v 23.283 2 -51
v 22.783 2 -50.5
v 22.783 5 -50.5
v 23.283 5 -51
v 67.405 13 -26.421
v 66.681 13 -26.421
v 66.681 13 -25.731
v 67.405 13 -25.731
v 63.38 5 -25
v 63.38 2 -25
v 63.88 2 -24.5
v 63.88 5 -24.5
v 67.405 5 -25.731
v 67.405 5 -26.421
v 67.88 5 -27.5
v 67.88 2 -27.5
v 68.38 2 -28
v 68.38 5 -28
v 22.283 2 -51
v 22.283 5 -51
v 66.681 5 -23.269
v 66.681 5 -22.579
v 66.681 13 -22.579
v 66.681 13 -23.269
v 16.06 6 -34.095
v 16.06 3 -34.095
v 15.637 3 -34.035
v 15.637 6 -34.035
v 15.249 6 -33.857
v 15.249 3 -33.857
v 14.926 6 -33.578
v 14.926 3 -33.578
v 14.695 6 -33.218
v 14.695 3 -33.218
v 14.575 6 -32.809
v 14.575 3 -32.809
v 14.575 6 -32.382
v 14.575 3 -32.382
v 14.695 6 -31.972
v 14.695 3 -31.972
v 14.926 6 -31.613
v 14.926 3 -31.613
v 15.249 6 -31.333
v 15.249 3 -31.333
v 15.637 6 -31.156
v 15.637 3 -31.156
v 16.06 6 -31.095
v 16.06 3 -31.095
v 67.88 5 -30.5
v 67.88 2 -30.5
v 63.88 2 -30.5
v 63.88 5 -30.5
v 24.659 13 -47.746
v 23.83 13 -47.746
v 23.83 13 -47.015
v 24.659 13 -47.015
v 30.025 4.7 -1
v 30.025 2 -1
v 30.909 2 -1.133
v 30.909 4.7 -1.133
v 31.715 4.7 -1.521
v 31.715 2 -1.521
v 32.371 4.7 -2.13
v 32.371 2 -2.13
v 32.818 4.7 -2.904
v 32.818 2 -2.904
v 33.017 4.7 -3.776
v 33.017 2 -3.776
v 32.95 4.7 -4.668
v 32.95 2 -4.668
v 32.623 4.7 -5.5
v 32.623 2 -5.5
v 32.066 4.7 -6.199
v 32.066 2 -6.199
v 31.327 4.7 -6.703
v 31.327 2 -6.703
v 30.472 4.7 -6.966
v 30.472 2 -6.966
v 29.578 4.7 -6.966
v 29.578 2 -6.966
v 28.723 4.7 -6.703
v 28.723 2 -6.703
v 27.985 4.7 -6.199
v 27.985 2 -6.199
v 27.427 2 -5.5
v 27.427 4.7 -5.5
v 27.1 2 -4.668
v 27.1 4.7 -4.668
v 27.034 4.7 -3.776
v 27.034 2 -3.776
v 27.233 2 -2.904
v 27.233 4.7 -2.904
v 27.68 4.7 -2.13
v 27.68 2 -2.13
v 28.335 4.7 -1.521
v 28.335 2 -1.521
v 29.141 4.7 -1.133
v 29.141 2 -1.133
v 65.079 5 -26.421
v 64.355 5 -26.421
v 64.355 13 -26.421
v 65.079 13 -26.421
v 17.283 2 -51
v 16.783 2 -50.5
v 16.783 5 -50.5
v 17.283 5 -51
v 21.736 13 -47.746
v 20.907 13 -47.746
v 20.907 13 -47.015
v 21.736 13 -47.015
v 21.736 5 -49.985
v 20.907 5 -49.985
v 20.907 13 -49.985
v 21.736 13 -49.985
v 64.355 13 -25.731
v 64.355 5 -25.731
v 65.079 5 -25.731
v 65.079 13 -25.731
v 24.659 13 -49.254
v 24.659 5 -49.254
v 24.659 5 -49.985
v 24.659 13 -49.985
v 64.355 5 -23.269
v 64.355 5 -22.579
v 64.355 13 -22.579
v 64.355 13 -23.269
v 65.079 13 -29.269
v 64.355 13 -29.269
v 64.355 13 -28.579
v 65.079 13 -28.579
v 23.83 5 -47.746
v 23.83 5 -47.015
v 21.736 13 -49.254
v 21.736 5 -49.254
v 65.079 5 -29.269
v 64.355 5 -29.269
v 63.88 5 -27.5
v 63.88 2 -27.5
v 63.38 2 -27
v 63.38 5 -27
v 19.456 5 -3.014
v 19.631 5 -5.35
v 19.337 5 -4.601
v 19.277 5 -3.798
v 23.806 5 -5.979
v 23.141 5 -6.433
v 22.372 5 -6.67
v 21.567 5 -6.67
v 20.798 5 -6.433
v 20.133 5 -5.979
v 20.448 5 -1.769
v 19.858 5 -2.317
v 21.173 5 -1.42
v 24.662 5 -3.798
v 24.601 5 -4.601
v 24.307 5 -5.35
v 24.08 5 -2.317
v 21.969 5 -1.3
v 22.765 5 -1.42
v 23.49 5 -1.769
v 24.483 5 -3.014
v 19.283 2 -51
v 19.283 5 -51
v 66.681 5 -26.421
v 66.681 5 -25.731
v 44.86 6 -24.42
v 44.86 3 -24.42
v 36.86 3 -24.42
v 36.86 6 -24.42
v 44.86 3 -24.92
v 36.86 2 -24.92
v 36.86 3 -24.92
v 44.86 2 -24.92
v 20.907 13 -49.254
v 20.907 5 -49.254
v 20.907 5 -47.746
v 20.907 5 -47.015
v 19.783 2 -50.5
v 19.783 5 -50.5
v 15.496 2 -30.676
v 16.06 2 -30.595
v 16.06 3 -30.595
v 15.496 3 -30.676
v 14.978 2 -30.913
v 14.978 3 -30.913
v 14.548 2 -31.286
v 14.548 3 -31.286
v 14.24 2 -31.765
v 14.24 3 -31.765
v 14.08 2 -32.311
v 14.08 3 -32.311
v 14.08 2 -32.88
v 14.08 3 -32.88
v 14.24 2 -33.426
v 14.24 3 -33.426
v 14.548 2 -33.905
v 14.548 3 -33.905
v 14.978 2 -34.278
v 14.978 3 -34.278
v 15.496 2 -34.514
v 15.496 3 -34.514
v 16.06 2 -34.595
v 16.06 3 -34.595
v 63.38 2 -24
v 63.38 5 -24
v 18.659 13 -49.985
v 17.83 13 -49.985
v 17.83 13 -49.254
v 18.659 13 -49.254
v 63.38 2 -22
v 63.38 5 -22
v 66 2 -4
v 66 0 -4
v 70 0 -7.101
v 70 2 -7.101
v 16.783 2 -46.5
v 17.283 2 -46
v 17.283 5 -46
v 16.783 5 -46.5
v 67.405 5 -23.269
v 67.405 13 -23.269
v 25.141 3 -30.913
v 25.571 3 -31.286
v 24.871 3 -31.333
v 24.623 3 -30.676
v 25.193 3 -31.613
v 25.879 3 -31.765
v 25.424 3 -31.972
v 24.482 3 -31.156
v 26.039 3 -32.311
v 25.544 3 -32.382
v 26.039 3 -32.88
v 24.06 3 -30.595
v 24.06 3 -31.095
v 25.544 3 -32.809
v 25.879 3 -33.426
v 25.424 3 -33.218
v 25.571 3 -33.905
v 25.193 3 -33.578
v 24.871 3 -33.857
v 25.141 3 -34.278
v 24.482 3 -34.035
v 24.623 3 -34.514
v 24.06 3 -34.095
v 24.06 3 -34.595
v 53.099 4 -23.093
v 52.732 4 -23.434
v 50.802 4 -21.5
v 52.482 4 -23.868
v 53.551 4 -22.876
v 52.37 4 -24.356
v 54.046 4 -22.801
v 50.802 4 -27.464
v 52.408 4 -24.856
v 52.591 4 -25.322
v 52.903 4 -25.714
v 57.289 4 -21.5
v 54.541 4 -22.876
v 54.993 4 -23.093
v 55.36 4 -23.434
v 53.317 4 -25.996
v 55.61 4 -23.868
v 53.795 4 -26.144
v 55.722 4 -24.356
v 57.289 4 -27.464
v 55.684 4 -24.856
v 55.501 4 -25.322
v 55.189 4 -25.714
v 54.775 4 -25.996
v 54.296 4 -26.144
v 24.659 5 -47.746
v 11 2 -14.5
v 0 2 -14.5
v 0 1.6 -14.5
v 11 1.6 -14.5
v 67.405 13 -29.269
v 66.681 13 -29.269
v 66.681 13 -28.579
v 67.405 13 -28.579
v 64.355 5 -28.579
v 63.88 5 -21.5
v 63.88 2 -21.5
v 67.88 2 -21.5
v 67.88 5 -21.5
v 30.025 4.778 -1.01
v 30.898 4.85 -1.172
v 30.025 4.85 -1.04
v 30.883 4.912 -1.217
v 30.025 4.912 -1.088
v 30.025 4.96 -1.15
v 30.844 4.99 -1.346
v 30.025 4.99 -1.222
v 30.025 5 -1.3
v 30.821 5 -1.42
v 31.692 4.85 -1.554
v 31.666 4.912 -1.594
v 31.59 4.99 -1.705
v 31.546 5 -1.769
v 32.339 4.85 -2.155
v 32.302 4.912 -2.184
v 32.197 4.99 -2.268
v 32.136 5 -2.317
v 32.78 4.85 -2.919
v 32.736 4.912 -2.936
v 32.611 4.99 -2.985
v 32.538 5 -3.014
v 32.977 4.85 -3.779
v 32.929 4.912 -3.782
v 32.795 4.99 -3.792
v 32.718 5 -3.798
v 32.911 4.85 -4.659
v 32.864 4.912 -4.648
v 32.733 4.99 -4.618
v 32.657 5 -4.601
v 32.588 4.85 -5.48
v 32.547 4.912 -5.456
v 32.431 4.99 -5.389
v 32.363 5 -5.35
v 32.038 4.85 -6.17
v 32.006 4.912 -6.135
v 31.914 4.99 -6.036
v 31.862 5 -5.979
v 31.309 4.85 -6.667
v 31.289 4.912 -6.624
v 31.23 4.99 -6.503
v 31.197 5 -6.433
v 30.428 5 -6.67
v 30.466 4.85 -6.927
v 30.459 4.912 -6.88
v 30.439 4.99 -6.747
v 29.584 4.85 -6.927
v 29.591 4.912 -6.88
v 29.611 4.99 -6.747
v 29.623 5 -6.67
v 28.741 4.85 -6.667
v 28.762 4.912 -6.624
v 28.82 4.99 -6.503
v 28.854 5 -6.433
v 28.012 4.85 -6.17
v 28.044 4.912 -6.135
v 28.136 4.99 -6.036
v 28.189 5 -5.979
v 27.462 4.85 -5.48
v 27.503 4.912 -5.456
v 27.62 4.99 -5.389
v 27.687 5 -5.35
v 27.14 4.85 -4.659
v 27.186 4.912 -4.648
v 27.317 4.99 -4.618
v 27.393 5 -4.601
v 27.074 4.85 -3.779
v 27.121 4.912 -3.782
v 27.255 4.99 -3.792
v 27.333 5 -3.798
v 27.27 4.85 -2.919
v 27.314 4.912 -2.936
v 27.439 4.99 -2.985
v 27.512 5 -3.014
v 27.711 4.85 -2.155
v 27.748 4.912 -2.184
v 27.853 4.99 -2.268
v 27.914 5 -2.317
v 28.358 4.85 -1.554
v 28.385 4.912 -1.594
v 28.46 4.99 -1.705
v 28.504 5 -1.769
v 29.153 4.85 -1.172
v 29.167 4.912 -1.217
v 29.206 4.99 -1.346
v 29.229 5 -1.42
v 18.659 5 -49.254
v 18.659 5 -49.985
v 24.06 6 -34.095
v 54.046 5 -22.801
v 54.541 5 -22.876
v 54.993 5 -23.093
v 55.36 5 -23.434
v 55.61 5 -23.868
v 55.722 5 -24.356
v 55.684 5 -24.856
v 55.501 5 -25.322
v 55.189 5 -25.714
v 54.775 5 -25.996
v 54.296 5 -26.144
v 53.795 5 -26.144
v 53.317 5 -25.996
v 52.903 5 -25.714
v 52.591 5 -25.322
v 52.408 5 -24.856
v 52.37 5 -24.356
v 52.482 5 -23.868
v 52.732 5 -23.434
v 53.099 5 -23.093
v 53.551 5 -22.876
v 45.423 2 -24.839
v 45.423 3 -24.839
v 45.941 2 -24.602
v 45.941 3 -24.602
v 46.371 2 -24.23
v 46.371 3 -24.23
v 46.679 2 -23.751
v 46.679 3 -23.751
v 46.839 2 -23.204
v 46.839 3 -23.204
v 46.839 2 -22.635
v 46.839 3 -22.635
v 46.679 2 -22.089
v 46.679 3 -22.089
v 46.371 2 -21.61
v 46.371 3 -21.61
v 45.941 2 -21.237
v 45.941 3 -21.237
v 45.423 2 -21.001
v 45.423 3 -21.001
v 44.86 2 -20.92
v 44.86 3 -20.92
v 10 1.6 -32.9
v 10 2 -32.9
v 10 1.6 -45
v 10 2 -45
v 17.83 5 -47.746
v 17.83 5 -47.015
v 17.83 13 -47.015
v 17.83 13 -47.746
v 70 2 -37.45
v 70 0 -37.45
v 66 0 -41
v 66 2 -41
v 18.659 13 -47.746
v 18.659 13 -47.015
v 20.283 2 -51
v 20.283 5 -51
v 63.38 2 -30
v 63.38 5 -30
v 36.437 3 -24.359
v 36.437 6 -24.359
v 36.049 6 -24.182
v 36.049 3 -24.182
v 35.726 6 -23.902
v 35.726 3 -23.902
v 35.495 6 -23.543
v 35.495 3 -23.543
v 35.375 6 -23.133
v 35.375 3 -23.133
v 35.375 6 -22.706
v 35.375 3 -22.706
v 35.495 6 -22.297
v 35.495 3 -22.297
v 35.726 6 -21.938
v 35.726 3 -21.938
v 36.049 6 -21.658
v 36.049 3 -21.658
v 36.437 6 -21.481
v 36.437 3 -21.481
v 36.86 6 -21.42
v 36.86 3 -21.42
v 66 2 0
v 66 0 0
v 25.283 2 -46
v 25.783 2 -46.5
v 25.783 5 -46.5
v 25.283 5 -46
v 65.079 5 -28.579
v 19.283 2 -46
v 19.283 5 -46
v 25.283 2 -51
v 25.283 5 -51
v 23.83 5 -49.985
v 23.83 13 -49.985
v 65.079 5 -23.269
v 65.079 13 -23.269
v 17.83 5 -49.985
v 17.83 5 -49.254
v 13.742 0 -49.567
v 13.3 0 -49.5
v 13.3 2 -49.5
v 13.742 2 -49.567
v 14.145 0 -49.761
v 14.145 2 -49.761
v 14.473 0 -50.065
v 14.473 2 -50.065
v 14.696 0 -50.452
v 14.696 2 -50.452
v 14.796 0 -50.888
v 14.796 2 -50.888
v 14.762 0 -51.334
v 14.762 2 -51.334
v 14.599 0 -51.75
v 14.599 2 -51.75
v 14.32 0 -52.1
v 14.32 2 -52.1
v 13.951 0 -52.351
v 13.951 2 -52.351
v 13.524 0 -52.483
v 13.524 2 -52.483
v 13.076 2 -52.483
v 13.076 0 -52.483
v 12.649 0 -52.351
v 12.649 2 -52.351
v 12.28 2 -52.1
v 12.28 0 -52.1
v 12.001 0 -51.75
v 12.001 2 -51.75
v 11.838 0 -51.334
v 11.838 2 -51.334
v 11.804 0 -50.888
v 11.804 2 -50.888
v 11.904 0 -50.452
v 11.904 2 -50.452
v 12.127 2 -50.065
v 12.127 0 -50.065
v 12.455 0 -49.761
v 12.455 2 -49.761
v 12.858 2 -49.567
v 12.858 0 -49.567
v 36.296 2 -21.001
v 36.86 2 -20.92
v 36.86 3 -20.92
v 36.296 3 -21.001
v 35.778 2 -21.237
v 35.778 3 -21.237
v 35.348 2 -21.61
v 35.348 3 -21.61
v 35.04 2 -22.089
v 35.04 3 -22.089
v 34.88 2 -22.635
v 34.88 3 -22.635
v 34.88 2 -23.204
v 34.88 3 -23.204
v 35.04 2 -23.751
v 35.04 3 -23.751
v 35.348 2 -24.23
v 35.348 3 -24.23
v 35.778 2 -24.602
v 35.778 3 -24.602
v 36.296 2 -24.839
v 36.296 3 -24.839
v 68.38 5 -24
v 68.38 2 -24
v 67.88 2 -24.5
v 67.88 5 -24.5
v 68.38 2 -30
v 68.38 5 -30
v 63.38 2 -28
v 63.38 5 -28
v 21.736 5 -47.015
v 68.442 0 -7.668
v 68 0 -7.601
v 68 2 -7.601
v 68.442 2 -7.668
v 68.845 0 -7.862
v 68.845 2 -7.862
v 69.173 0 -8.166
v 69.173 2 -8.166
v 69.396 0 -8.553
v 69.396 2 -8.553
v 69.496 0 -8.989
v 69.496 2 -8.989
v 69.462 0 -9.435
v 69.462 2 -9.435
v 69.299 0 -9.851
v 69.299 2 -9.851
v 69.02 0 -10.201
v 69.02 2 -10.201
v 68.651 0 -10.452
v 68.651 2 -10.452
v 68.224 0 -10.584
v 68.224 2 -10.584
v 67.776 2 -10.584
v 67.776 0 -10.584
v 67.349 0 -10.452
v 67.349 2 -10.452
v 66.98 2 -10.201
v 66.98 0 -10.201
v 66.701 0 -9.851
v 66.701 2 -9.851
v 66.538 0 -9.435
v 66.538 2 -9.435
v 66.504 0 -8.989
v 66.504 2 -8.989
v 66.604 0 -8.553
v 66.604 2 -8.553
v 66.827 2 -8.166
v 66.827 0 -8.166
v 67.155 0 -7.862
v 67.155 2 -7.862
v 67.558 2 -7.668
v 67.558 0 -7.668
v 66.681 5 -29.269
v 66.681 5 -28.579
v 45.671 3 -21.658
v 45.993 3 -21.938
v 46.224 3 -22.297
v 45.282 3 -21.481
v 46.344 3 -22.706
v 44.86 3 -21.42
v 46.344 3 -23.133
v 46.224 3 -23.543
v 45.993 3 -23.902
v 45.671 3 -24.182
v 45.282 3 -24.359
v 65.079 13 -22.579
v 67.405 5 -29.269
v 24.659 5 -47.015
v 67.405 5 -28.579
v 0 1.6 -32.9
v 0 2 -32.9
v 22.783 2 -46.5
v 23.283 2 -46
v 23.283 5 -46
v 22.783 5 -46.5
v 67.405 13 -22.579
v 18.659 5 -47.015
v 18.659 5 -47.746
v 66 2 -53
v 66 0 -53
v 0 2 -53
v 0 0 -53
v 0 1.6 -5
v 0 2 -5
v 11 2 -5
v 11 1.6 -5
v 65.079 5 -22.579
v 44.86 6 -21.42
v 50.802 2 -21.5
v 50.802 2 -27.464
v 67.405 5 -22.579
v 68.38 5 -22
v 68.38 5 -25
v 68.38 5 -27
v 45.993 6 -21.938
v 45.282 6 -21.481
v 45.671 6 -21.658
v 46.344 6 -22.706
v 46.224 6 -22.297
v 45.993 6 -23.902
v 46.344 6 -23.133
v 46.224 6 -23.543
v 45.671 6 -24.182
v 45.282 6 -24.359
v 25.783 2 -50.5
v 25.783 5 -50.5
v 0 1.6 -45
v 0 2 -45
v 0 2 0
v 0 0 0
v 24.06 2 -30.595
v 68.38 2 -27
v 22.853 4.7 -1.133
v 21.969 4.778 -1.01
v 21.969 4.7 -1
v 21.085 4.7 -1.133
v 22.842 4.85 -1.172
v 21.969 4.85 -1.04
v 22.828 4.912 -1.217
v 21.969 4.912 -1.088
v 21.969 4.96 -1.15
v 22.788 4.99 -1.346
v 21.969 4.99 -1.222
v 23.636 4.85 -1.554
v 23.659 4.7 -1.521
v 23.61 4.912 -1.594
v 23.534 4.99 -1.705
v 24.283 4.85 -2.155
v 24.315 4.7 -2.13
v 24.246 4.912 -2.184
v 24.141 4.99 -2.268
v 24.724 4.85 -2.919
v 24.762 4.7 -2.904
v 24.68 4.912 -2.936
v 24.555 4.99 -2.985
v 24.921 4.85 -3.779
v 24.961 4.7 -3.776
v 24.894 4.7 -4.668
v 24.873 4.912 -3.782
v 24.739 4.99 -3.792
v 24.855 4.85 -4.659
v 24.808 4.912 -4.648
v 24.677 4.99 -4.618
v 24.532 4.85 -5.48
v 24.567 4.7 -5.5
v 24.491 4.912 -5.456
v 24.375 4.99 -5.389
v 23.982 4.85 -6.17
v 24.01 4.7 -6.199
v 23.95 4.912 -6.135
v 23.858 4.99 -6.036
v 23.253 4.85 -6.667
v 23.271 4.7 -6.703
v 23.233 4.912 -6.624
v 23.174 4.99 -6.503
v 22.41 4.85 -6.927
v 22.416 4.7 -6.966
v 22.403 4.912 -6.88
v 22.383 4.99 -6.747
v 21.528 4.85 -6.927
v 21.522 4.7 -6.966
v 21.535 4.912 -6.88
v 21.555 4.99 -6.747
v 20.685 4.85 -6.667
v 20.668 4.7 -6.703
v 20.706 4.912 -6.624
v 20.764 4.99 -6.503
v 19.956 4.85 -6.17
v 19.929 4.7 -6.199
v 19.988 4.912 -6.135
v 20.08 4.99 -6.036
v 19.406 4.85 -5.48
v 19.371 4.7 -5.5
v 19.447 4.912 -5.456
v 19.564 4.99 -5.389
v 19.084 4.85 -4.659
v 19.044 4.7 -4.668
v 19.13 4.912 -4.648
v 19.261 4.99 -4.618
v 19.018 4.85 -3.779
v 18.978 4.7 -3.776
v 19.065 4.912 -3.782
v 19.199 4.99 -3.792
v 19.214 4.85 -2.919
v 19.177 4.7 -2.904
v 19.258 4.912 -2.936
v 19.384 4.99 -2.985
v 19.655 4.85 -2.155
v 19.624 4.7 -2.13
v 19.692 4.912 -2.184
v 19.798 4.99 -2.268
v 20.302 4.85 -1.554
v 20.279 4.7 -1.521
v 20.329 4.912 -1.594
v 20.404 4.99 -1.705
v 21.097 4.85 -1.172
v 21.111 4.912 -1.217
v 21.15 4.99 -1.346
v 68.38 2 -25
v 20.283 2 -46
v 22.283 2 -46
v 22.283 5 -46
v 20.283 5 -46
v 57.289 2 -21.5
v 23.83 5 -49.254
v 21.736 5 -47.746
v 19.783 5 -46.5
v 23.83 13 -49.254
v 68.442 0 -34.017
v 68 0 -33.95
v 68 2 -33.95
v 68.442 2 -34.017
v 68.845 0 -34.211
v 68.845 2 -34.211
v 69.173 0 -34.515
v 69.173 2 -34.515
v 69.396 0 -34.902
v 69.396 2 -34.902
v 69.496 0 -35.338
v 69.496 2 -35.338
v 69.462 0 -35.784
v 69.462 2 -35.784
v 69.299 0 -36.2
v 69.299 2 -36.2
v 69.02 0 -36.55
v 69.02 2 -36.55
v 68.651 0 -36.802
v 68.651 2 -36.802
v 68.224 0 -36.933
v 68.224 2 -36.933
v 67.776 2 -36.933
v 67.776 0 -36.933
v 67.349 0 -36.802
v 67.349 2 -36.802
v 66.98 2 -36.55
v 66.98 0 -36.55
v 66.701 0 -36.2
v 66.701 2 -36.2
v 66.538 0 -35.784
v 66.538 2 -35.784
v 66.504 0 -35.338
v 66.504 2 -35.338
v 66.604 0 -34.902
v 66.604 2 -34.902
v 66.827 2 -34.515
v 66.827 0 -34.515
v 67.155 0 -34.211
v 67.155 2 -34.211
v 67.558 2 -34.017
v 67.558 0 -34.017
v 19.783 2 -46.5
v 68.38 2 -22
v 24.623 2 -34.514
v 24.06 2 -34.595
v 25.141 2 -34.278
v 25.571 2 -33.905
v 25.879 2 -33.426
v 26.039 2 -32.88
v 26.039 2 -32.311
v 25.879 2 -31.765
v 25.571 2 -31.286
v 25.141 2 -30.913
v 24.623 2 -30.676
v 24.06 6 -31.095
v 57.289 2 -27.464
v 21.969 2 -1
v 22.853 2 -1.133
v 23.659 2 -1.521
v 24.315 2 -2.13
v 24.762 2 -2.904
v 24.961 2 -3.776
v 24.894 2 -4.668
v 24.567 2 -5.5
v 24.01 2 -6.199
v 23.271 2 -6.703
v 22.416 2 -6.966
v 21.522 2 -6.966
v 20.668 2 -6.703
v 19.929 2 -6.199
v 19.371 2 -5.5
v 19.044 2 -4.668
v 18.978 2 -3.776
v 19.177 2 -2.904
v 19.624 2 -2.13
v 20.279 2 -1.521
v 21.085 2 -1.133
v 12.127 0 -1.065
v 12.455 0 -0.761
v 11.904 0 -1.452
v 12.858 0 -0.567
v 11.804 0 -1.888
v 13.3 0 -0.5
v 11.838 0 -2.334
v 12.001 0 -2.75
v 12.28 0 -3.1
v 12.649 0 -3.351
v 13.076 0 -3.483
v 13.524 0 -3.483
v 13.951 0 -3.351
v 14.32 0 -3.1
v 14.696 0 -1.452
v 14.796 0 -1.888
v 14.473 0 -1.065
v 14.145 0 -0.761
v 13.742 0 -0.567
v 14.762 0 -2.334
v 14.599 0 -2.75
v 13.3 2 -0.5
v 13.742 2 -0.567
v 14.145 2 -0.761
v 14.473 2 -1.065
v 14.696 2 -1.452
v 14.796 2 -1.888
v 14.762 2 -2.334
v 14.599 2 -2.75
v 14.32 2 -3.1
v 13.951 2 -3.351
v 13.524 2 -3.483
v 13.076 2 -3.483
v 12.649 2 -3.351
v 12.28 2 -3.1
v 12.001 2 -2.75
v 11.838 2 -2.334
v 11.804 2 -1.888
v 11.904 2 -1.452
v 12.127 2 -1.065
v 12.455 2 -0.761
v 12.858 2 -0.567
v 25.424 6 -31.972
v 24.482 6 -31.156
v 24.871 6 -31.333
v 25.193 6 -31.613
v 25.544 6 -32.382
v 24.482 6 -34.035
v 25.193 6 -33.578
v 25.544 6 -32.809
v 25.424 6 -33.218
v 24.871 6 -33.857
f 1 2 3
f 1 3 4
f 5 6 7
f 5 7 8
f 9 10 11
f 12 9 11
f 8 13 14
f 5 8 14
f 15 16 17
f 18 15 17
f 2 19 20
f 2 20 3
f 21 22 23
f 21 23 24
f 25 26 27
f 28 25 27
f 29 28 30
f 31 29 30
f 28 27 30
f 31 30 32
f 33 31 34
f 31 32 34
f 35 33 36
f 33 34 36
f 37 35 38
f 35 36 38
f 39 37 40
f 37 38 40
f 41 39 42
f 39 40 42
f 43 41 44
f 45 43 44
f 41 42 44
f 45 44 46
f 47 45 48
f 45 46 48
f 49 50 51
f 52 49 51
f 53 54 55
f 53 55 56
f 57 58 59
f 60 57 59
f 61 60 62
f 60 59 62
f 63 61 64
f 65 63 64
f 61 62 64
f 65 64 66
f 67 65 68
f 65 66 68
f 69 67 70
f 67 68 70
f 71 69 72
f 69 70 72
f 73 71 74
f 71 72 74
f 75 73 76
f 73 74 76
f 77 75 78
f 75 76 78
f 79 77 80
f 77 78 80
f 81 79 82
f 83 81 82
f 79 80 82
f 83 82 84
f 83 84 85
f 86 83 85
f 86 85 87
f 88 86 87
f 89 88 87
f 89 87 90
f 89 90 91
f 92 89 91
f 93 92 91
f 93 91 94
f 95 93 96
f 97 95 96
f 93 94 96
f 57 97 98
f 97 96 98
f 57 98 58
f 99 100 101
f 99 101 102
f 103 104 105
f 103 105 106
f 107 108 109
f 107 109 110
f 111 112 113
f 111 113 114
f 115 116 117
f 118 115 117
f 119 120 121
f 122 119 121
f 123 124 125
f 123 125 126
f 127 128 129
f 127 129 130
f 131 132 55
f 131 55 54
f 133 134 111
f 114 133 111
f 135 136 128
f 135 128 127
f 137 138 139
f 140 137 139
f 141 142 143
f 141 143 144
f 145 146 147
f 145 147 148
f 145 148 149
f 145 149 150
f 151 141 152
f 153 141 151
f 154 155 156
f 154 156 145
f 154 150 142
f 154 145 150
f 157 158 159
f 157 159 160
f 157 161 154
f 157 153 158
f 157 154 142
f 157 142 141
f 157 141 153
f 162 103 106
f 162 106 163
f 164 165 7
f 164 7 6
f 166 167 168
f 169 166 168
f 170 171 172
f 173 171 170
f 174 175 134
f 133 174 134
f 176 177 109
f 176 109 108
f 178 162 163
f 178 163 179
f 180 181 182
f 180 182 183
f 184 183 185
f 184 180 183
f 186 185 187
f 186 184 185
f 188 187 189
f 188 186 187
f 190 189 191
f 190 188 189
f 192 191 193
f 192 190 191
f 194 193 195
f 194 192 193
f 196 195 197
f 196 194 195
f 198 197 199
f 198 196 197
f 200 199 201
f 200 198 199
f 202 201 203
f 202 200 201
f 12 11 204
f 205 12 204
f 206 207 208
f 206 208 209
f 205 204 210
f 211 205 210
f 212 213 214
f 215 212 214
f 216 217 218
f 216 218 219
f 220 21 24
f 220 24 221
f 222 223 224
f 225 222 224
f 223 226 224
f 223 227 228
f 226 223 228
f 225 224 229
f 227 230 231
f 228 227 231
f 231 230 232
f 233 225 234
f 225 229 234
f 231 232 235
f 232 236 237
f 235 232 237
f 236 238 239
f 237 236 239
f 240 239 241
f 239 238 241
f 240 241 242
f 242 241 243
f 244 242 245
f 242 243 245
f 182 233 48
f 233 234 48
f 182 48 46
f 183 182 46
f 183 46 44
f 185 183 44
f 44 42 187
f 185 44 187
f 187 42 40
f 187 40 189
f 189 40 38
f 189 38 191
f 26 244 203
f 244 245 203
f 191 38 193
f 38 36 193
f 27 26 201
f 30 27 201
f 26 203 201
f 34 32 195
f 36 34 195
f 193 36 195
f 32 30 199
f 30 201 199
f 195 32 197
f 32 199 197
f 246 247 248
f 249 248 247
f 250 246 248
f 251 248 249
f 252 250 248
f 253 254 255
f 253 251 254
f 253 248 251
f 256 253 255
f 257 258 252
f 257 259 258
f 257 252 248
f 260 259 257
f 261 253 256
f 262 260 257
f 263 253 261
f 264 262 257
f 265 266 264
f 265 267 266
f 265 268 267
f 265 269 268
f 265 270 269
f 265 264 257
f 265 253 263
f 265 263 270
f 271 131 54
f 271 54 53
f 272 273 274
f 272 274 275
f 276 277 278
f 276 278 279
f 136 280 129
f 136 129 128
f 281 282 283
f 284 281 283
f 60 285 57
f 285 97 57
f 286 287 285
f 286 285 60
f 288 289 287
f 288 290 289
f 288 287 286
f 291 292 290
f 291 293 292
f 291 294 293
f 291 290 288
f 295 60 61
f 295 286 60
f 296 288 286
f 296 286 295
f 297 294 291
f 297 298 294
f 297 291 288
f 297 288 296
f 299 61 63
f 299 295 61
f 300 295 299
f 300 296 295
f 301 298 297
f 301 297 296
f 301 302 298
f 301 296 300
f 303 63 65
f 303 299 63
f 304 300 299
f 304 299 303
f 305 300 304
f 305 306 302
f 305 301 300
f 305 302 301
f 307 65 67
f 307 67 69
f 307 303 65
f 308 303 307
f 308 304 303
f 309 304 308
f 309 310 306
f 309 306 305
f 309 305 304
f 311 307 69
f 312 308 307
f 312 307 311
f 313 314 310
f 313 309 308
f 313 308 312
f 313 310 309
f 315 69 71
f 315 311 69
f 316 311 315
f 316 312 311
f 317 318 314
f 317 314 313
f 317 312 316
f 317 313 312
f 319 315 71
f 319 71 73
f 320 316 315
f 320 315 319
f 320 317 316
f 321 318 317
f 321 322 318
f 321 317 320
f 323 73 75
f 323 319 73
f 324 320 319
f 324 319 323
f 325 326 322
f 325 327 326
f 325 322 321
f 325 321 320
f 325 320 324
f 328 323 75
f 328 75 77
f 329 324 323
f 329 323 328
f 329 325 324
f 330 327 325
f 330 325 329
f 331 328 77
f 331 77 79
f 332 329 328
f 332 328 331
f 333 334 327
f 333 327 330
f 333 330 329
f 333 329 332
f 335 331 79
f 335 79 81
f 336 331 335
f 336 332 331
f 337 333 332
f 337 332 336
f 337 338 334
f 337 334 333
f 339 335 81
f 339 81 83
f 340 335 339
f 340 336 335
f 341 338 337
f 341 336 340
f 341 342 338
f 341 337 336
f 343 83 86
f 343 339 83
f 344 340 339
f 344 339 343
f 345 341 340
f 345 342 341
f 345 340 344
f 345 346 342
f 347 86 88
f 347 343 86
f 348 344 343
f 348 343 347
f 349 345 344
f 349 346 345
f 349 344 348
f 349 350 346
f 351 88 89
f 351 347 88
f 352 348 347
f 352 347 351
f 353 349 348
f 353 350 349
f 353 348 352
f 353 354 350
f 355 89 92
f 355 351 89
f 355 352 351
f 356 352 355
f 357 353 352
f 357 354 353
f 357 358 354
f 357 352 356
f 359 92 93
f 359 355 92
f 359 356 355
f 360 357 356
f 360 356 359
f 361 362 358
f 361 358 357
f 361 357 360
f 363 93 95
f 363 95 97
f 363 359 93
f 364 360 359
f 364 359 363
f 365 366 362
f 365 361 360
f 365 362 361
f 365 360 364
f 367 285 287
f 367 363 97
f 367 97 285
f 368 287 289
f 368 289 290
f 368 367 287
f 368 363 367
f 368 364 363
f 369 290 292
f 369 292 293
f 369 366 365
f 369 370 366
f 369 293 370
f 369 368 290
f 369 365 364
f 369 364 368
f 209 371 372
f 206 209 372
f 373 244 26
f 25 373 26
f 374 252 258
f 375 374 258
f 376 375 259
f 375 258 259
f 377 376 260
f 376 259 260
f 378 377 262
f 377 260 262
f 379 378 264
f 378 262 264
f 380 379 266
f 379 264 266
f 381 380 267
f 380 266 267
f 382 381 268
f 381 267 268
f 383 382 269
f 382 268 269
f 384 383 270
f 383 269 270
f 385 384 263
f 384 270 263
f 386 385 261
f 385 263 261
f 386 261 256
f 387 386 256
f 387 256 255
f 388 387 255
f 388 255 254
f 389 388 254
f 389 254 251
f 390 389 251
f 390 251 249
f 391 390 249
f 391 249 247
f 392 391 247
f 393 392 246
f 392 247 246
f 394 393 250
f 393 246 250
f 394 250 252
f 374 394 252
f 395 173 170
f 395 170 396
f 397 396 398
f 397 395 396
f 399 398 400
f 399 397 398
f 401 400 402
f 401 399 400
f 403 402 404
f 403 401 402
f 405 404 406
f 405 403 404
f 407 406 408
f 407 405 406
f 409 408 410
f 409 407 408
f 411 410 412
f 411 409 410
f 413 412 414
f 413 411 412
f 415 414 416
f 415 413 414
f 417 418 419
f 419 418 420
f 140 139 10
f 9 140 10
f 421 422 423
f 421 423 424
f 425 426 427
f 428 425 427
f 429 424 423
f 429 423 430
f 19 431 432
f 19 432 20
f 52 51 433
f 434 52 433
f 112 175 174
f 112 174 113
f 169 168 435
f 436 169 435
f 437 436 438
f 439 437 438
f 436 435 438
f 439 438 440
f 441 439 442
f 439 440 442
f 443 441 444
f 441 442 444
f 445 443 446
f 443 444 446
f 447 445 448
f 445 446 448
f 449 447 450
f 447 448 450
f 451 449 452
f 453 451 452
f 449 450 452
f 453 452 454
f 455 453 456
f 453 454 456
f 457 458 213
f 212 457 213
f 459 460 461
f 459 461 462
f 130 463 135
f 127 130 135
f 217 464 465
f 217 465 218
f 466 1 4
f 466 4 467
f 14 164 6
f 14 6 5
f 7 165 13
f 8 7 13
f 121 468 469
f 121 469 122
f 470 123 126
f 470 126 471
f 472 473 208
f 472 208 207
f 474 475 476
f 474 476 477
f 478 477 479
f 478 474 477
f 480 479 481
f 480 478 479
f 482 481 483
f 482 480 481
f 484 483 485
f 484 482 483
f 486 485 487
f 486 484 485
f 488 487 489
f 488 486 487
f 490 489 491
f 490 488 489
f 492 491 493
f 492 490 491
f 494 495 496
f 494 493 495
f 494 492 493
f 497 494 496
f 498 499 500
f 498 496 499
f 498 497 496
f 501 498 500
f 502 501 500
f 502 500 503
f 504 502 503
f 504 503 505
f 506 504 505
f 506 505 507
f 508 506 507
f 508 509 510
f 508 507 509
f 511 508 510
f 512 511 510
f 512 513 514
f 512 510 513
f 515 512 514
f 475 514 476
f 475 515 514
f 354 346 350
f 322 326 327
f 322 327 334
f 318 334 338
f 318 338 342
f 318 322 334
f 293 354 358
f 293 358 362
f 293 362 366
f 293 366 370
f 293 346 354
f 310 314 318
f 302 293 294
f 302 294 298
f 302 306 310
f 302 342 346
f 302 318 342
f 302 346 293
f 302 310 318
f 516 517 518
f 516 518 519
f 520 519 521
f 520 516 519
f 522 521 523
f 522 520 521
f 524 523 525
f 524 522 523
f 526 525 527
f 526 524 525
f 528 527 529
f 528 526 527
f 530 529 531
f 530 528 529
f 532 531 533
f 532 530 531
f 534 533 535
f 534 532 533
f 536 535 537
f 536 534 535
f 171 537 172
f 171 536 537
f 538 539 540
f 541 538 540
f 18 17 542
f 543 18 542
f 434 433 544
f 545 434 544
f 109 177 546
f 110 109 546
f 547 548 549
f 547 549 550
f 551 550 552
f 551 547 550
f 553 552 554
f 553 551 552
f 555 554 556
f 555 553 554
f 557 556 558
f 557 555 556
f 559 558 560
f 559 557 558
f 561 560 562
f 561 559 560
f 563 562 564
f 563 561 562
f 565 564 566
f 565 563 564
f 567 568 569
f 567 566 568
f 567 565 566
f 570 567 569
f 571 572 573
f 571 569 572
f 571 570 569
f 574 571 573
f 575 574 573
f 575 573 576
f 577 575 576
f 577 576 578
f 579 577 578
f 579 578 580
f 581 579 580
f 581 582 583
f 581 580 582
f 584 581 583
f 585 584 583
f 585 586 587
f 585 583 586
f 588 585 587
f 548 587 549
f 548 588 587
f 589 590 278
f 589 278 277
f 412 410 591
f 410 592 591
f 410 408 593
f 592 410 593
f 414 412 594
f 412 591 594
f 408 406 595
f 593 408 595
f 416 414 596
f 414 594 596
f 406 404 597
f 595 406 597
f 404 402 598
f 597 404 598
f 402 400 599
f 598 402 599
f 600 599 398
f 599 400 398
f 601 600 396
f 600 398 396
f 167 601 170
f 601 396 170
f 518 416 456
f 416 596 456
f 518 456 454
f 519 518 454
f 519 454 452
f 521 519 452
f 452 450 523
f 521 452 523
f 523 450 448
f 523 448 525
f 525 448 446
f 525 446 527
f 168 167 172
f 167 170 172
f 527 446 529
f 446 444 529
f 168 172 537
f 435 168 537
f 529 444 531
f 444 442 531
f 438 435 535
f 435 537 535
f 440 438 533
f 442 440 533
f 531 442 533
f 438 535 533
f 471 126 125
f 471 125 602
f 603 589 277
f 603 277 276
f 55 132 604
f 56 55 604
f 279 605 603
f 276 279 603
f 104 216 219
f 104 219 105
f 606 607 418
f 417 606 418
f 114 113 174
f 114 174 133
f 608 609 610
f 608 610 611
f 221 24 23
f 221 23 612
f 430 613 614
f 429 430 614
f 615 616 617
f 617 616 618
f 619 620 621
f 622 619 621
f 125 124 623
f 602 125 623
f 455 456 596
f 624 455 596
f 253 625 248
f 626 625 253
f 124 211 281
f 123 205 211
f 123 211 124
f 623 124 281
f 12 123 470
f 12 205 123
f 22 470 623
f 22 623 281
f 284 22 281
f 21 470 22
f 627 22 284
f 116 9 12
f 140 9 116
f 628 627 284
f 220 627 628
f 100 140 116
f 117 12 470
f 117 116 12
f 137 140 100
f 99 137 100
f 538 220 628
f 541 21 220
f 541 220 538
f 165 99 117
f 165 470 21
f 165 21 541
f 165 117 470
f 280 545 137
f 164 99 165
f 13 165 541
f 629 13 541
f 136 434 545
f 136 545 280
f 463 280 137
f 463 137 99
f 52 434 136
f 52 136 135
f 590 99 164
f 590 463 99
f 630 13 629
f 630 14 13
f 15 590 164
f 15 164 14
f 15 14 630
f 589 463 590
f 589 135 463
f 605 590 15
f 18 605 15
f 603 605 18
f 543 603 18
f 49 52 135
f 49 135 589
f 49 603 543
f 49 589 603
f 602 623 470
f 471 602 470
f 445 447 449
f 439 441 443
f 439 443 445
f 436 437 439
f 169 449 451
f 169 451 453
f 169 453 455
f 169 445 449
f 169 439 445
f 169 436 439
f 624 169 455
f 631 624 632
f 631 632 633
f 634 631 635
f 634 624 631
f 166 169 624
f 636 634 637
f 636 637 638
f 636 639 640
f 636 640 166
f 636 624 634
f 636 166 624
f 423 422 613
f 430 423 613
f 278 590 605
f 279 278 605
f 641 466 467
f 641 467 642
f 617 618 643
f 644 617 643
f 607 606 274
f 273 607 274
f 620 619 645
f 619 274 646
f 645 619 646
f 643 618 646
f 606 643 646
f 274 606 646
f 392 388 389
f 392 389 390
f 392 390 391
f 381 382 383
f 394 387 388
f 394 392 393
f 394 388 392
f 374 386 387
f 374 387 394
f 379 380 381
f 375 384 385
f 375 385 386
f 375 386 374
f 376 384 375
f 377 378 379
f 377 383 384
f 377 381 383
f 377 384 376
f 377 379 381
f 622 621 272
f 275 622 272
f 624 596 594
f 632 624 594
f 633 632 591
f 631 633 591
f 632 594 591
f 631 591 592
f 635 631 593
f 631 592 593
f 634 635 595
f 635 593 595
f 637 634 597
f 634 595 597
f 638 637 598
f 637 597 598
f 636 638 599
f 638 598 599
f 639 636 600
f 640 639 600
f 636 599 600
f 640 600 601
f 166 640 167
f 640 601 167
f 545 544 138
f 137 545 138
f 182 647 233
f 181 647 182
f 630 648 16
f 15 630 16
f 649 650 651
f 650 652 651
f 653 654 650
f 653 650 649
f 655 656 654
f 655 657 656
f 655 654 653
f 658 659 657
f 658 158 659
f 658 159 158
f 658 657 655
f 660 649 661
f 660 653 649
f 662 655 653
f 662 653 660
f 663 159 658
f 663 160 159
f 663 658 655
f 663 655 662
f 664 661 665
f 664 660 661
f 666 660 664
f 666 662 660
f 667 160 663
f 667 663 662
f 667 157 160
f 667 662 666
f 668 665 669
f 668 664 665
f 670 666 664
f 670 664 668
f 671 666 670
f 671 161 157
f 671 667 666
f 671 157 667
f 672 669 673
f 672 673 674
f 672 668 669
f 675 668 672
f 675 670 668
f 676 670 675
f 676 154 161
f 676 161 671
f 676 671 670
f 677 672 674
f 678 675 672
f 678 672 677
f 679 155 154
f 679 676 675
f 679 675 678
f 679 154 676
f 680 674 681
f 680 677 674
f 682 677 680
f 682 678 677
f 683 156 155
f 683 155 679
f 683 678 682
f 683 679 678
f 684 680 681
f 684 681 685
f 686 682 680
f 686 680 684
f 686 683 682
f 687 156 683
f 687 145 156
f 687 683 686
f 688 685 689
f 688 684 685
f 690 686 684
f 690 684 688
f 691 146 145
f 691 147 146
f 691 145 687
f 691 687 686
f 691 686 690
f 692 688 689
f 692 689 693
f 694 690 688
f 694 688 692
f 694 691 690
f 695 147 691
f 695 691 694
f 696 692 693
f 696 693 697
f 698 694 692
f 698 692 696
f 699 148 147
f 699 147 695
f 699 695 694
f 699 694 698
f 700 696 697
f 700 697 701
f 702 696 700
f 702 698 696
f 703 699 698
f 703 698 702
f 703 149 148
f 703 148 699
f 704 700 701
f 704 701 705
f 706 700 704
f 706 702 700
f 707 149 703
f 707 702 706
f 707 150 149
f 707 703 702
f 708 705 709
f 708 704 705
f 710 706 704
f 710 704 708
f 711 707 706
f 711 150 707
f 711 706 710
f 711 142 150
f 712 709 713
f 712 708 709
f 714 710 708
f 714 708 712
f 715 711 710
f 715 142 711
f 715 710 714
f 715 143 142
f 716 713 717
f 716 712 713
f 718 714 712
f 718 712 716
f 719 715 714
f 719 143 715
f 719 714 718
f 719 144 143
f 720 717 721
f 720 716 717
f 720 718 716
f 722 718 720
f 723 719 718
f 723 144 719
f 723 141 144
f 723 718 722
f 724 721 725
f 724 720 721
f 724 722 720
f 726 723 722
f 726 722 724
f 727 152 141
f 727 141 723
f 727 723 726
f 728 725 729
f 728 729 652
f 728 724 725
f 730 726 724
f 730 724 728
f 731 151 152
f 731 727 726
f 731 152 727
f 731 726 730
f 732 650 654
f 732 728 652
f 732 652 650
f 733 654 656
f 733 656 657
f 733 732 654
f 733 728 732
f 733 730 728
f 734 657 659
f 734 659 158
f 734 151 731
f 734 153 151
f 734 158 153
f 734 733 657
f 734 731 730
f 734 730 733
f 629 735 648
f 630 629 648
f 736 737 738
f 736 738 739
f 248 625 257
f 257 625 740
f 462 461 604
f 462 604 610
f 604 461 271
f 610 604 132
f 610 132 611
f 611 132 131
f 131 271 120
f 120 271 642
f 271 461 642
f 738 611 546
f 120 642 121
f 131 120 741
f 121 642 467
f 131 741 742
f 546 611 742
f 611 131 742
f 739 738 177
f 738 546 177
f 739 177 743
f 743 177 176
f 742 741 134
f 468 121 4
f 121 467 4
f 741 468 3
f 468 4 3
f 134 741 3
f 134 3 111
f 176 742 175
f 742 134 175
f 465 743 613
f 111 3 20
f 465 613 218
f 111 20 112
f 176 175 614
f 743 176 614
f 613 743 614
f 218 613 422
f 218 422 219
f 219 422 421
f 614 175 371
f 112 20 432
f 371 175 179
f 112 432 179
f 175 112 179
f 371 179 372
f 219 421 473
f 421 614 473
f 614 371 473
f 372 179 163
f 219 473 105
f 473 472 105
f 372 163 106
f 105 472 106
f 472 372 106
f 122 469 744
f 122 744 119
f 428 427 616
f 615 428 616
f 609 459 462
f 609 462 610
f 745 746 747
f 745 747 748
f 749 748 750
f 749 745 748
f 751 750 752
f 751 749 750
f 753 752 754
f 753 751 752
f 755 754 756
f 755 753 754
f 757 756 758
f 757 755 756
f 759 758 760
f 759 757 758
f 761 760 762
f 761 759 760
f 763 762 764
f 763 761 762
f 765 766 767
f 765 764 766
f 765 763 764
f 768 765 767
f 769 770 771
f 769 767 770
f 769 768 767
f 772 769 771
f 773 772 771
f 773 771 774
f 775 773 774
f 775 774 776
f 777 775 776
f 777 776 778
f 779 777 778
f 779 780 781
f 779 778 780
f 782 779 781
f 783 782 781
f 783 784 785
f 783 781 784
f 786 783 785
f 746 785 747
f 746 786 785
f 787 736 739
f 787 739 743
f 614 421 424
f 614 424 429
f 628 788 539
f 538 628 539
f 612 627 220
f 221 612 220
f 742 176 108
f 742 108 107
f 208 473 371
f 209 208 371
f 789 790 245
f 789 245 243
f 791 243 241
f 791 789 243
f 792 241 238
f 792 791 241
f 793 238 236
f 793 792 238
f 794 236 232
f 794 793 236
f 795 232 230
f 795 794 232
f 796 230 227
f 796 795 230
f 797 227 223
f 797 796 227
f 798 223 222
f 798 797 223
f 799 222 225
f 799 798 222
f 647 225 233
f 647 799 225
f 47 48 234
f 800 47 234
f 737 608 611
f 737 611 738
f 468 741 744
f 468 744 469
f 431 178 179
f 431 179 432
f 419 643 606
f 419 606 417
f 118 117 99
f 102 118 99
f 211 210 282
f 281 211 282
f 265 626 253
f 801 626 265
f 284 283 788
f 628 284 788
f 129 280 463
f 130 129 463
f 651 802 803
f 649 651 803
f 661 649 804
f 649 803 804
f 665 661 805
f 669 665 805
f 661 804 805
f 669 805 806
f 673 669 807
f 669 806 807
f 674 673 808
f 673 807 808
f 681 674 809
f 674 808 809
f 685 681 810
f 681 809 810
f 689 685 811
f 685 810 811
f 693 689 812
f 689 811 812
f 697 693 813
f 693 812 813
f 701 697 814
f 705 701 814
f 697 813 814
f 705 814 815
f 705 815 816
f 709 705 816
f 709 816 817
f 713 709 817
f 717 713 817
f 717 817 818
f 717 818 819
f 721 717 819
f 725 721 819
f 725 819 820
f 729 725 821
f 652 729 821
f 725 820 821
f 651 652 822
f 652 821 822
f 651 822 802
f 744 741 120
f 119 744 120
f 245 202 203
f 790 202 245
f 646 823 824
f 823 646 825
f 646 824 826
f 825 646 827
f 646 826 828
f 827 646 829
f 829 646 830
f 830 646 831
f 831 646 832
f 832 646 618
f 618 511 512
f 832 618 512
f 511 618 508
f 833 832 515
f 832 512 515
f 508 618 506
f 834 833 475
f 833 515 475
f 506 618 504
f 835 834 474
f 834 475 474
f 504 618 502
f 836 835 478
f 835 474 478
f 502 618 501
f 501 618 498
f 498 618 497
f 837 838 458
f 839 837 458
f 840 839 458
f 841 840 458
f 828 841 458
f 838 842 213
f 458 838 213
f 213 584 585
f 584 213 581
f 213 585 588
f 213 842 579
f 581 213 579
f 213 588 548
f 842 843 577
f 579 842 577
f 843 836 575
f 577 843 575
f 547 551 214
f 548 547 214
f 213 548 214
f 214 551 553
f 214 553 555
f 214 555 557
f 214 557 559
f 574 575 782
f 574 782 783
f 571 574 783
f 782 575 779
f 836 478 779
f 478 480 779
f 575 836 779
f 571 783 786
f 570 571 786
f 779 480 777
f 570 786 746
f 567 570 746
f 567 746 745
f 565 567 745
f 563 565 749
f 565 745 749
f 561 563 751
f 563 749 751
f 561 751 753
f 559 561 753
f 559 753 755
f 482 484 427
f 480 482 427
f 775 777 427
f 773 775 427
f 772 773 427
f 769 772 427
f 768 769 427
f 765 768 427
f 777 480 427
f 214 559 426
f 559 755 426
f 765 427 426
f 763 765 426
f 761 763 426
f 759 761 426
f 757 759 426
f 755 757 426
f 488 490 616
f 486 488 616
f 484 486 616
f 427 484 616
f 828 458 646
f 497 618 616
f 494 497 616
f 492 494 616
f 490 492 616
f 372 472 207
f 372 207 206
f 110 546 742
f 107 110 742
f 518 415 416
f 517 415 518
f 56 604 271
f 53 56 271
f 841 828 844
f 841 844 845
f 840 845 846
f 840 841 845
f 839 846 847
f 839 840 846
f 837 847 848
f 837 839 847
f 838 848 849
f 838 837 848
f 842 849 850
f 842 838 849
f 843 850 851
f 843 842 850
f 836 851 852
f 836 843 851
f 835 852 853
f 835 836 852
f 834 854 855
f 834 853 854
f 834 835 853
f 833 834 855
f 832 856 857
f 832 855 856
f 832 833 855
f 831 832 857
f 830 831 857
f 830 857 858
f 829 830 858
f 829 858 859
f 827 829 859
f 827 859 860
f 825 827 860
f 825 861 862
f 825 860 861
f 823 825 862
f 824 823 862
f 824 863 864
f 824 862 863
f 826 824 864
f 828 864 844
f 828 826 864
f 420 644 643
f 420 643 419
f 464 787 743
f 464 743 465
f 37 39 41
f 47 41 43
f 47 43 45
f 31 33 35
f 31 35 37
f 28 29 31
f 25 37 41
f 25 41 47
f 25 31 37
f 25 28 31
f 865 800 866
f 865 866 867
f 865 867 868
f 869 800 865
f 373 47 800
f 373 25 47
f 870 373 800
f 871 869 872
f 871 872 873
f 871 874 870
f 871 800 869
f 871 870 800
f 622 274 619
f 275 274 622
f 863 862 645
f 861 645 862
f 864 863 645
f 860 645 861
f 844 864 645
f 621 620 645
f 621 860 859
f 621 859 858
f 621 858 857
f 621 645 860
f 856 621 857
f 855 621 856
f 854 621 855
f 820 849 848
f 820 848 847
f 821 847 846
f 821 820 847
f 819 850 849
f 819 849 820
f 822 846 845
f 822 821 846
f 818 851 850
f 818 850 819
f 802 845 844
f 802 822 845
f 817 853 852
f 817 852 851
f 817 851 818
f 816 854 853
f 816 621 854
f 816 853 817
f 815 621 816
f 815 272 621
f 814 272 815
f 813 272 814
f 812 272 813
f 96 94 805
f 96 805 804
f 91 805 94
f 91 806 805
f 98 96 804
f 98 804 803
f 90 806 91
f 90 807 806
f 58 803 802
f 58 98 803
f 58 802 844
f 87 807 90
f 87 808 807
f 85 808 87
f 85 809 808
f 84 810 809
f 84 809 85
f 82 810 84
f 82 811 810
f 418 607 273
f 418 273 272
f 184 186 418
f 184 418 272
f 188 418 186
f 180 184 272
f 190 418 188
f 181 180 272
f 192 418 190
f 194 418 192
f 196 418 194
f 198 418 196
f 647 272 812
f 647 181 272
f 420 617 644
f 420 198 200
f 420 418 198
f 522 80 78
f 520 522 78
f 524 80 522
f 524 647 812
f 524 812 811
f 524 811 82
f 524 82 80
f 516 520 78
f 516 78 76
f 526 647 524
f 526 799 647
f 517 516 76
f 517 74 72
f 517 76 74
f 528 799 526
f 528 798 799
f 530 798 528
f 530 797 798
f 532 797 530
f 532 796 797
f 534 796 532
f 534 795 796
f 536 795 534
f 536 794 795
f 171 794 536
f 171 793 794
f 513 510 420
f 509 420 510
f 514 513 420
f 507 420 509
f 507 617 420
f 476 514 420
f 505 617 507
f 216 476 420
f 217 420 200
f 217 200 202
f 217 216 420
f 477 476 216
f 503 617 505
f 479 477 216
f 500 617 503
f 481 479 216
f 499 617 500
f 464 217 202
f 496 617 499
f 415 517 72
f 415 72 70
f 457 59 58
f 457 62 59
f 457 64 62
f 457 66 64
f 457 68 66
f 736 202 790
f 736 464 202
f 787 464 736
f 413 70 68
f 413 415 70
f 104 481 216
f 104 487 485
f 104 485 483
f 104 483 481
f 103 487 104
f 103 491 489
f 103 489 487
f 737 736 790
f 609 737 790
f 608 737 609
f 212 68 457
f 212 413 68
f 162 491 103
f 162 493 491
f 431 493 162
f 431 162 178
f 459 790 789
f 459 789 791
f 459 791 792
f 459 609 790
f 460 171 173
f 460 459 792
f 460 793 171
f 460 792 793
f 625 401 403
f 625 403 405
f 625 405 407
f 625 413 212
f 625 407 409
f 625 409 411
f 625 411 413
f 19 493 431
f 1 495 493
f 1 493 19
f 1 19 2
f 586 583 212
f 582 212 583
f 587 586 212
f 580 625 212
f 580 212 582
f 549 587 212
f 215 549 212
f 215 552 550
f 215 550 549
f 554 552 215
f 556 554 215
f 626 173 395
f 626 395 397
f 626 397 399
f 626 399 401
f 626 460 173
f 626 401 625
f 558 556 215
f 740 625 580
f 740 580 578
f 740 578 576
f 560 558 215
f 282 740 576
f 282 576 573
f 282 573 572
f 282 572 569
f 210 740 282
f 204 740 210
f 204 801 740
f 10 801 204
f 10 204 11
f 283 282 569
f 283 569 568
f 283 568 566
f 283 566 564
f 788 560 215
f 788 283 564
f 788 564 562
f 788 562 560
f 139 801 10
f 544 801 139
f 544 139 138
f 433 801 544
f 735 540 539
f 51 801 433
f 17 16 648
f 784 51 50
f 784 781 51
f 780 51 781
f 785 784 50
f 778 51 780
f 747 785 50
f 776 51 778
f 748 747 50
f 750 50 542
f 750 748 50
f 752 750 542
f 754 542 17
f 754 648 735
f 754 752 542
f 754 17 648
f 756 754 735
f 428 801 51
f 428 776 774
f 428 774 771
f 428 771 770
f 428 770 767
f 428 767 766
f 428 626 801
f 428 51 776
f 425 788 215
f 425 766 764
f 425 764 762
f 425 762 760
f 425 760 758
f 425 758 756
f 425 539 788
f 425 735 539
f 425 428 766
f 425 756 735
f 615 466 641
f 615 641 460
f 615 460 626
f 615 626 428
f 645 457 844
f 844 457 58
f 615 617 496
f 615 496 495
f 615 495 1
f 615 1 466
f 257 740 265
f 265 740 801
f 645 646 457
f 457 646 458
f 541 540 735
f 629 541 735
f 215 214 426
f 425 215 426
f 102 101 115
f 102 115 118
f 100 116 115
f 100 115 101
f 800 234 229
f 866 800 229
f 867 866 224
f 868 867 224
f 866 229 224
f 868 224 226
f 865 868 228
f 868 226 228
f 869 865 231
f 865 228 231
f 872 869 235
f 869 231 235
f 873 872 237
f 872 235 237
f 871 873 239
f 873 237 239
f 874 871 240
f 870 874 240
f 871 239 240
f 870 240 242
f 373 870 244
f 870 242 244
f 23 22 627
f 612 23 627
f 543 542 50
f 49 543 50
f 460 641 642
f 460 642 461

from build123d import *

# Parameters (mm, degrees)
BOSS_EXTRUDE1_DEPTH     = 2
CUT_EXTRUDE2_DEPTH      = 88.82368701
CUT_EXTRUDE2_DEPTH_BACK = 88.82368701
SKETCH2_R               = 1.5
CUT_EXTRUDE7_START      = 2
SKETCH3_W               = 10
SKETCH3_H               = 12.1
SKETCH3_W_2             = 11
SKETCH3_H_2             = 9.5
CUT_EXTRUDE7_DEPTH      = 0.4
BOSS_EXTRUDE2_DEPTH     = 3
LPATTERN1_COUNT         = 3
LPATTERN1_PITCH         = 3
SKETCH5_W               = 0.724136619
SKETCH5_H               = 0.689653923
BOSS_EXTRUDE4_DEPTH     = 8
BOSS_EXTRUDE5_DEPTH     = 3
LPATTERN3_COUNT         = 3
LPATTERN3_PITCH         = 3
SKETCH8_W               = 0.829728978
SKETCH8_H               = 0.730951718
BOSS_EXTRUDE6_DEPTH     = 8
SKETCH9_W               = 6.486986995
SKETCH9_H               = 5.963842883
BOSS_EXTRUDE7_DEPTH     = 2
SKETCH11_R              = 1.680495579
BOSS_EXTRUDE8_DEPTH     = 1
BOSS_EXTRUDE9_DEPTH     = 1
BOSS_EXTRUDE10_DEPTH    = 3
BOSS_EXTRUDE11_DEPTH    = 1
BOSS_EXTRUDE12_DEPTH    = 3
SKETCH16_R              = 3
BOSS_EXTRUDE13_DEPTH    = 3
FILLET1_R               = 0.3


with BuildPart() as part:
    # Sketch1 → Boss-Extrude1 (new body)
    with BuildSketch(Plane(origin=(0, 0, 0), x_dir=(1, 0, 0), z_dir=(0, 1, 0))):
        Polygon((0, 0), (66, 0), (66, 4), (70, 7.100943302), (70, 37.450193791), (66, 41), (66, 53), (0, 53), align=None)
    extrude(amount=BOSS_EXTRUDE1_DEPTH)

    # Sketch2 → Cut-Extrude2 (cut, two sides: drawn at the far end of the back side and taken through both)
    with BuildSketch(Plane(origin=(0, 0, 0), x_dir=(1, 0, 0), z_dir=(0, 1, 0)).offset(-CUT_EXTRUDE2_DEPTH_BACK)):
        with Locations(Location((68, 35.450193791, 0), (0, 0, 270))):
            Circle(SKETCH2_R)
        with Locations(Location((68, 9.100943302, 0), (0, 0, 270))):
            Circle(SKETCH2_R)
        with Locations(Location((13.3, 2, 0), (0, 0, 270))):
            Circle(SKETCH2_R)
        with Locations(Location((13.3, 51, 0), (0, 0, 270))):
            Circle(SKETCH2_R)
    extrude(amount=CUT_EXTRUDE2_DEPTH + CUT_EXTRUDE2_DEPTH_BACK, mode=Mode.SUBTRACT)

    # Sketch3 → Cut-Extrude7 (cut)
    with BuildSketch(Plane(origin=(0, 0, 0), x_dir=(1, 0, 0), z_dir=(0, 1, 0)).offset(CUT_EXTRUDE7_START)):
        with Locations((5, 38.95)):
            Rectangle(SKETCH3_W, SKETCH3_H)
        with Locations((5.5, 9.75)):
            Rectangle(SKETCH3_W_2, SKETCH3_H_2)
    extrude(amount=-CUT_EXTRUDE7_DEPTH, mode=Mode.SUBTRACT)

    # Sketch4 → Boss-Extrude2 (add)
    with BuildSketch(Plane(origin=(0, 2, 0), x_dir=(1, 0, 0), z_dir=(0, 1, 0))):
        Polygon((63.879895434, 30.5), (63.379895434, 30), (63.379895434, 28), (63.879895434, 27.5), (67.879895434, 27.5), (68.379895434, 28), (68.379895434, 30), (67.879895434, 30.5), align=None)
    boss_extrude2 = extrude(amount=BOSS_EXTRUDE2_DEPTH)

    # LPattern1: Boss-Extrude2 ×3
    with Locations(*[(0, 0, i * LPATTERN1_PITCH) for i in range(1, LPATTERN1_COUNT)]):
        add(boss_extrude2)

    # Sketch5 → Boss-Extrude4 (add)
    with BuildSketch(Plane(origin=(0, 5, 0), x_dir=(1, 0, 0), z_dir=(0, 1, 0))):
        with Locations((64.716683918, 28.923857239)):
            Rectangle(SKETCH5_W, SKETCH5_H)
        with Locations((67.04310695, 28.923857239)):
            Rectangle(SKETCH5_W, SKETCH5_H)
        with Locations((67.04310695, 26.076142762)):
            Rectangle(SKETCH5_W, SKETCH5_H)
        with Locations((64.716683918, 26.076142762)):
            Rectangle(SKETCH5_W, SKETCH5_H)
        with Locations((67.04310695, 22.923857239)):
            Rectangle(SKETCH5_W, SKETCH5_H)
        with Locations((64.716683918, 22.923857239)):
            Rectangle(SKETCH5_W, SKETCH5_H)
    extrude(amount=BOSS_EXTRUDE4_DEPTH)

    # Sketch6 → Boss-Extrude5 (add)
    with BuildSketch(Plane(origin=(0, 2, 0), x_dir=(1, 0, 0), z_dir=(0, 1, 0))):
        Polygon((17.282939777, 51), (19.282939777, 51), (19.782939777, 50.5), (19.782939777, 46.5), (19.282939777, 46), (17.282939777, 46), (16.782939777, 46.5), (16.782939777, 50.5), align=None)
    boss_extrude5 = extrude(amount=BOSS_EXTRUDE5_DEPTH)

    # LPattern3: Boss-Extrude5 ×3
    with Locations(*[(i * LPATTERN3_PITCH, 0, 0) for i in range(1, LPATTERN3_COUNT)]):
        add(boss_extrude5)

    # Sketch8 → Boss-Extrude6 (add)
    with BuildSketch(Plane(origin=(0, 5, 0), x_dir=(1, 0, 0), z_dir=(0, 1, 0))):
        with Locations((21.321404848, 49.61932377)):
            Rectangle(SKETCH8_W, SKETCH8_H)
        with Locations((18.244474705, 49.61932377)):
            Rectangle(SKETCH8_W, SKETCH8_H)
        with Locations((24.244474705, 49.61932377)):
            Rectangle(SKETCH8_W, SKETCH8_H)
        with Locations((24.244474705, 47.38067623)):
            Rectangle(SKETCH8_W, SKETCH8_H)
        with Locations((21.321404848, 47.38067623)):
            Rectangle(SKETCH8_W, SKETCH8_H)
        with Locations((18.244474705, 47.38067623)):
            Rectangle(SKETCH8_W, SKETCH8_H)
    extrude(amount=BOSS_EXTRUDE6_DEPTH)

    # Sketch9 → Boss-Extrude7 (add)
    with BuildSketch(Plane(origin=(0, 2, 0), x_dir=(1, 0, 0), z_dir=(0, 1, 0))):
        with Locations((54.045911219, 24.481921441)):
            Rectangle(SKETCH9_W, SKETCH9_H)
    extrude(amount=BOSS_EXTRUDE7_DEPTH)

    # Sketch11 → Boss-Extrude8 (add)
    with BuildSketch(Plane(origin=(0, 4, 0), x_dir=(1, 0, 0), z_dir=(0, 1, 0))):
        with Locations(Location((54.04591122, 24.481921441, 0), (0, 0, 270))):
            Circle(SKETCH11_R)
    extrude(amount=BOSS_EXTRUDE8_DEPTH)

    # Sketch12 → Boss-Extrude9 (add)
    with BuildSketch(Plane(origin=(0, 2, 0), x_dir=(1, 0, 0), z_dir=(0, 1, 0))):
        with BuildLine():
            Line((36.85972443, 24.919811949), (44.85972443, 24.919811949))
            ThreePointArc((44.85972443, 24.919811949), (46.85972443, 22.919811949), (44.85972443, 20.919811949))
            Line((44.85972443, 20.919811949), (36.85972443, 20.919811949))
            ThreePointArc((36.85972443, 20.919811949), (34.85972443, 22.919811949), (36.85972443, 24.919811949))
        make_face()
    extrude(amount=BOSS_EXTRUDE9_DEPTH)

    # Sketch13 → Boss-Extrude10 (add)
    with BuildSketch(Plane(origin=(0, 3, 0), x_dir=(1, 0, 0), z_dir=(0, 1, 0))):
        with BuildLine():
            Line((44.85972443, 24.419811949), (36.85972443, 24.419811949))
            ThreePointArc((36.85972443, 24.419811949), (35.35972443, 22.919811949), (36.85972443, 21.419811949))
            Line((36.85972443, 21.419811949), (44.85972443, 21.419811949))
            ThreePointArc((44.85972443, 21.419811949), (46.35972443, 22.919811949), (44.85972443, 24.419811949))
        make_face()
    extrude(amount=BOSS_EXTRUDE10_DEPTH)

    # Sketch14 → Boss-Extrude11 (add)
    with BuildSketch(Plane(origin=(0, 2, 0), x_dir=(1, 0, 0), z_dir=(0, 1, 0))):
        with BuildLine():
            Line((16.059725168, 34.595333511), (24.059725168, 34.595333511))
            ThreePointArc((24.059725168, 34.595333511), (26.059725168, 32.595333511), (24.059725168, 30.595333511))
            Line((24.059725168, 30.595333511), (16.059725168, 30.595333511))
            ThreePointArc((16.059725168, 30.595333511), (14.059725168, 32.595333511), (16.059725168, 34.595333511))
        make_face()
    extrude(amount=BOSS_EXTRUDE11_DEPTH)

    # Sketch15 → Boss-Extrude12 (add)
    with BuildSketch(Plane(origin=(0, 3, 0), x_dir=(1, 0, 0), z_dir=(0, 1, 0))):
        with BuildLine():
            Line((16.059725168, 31.095333511), (24.059725168, 31.095333511))
            ThreePointArc((24.059725168, 31.095333511), (25.559725168, 32.595333511), (24.059725168, 34.095333511))
            Line((24.059725168, 34.095333511), (16.059725168, 34.095333511))
            ThreePointArc((16.059725168, 34.095333511), (14.559725168, 32.595333511), (16.059725168, 31.095333511))
        make_face()
    extrude(amount=BOSS_EXTRUDE12_DEPTH)

    # Sketch16 → Boss-Extrude13 (add)
    with BuildSketch(Plane(origin=(0, 2, 0), x_dir=(1, 0, 0), z_dir=(0, 1, 0))):
        with Locations(Location((21.969175252, 4, 0), (0, 0, 270))):
            Circle(SKETCH16_R)
        with Locations(Location((30.025126654, 4, 0), (0, 0, 270))):
            Circle(SKETCH16_R)
    extrude(amount=BOSS_EXTRUDE13_DEPTH)

    # Fillet1
    fillet1_edges = [part.edges().sort_by_distance(p)[0] for p in [
        (21.969175252, 5, -7),
        (30.025126654, 5, -7),
    ]]
    fillet(fillet1_edges, radius=FILLET1_R)


solid = part.part
